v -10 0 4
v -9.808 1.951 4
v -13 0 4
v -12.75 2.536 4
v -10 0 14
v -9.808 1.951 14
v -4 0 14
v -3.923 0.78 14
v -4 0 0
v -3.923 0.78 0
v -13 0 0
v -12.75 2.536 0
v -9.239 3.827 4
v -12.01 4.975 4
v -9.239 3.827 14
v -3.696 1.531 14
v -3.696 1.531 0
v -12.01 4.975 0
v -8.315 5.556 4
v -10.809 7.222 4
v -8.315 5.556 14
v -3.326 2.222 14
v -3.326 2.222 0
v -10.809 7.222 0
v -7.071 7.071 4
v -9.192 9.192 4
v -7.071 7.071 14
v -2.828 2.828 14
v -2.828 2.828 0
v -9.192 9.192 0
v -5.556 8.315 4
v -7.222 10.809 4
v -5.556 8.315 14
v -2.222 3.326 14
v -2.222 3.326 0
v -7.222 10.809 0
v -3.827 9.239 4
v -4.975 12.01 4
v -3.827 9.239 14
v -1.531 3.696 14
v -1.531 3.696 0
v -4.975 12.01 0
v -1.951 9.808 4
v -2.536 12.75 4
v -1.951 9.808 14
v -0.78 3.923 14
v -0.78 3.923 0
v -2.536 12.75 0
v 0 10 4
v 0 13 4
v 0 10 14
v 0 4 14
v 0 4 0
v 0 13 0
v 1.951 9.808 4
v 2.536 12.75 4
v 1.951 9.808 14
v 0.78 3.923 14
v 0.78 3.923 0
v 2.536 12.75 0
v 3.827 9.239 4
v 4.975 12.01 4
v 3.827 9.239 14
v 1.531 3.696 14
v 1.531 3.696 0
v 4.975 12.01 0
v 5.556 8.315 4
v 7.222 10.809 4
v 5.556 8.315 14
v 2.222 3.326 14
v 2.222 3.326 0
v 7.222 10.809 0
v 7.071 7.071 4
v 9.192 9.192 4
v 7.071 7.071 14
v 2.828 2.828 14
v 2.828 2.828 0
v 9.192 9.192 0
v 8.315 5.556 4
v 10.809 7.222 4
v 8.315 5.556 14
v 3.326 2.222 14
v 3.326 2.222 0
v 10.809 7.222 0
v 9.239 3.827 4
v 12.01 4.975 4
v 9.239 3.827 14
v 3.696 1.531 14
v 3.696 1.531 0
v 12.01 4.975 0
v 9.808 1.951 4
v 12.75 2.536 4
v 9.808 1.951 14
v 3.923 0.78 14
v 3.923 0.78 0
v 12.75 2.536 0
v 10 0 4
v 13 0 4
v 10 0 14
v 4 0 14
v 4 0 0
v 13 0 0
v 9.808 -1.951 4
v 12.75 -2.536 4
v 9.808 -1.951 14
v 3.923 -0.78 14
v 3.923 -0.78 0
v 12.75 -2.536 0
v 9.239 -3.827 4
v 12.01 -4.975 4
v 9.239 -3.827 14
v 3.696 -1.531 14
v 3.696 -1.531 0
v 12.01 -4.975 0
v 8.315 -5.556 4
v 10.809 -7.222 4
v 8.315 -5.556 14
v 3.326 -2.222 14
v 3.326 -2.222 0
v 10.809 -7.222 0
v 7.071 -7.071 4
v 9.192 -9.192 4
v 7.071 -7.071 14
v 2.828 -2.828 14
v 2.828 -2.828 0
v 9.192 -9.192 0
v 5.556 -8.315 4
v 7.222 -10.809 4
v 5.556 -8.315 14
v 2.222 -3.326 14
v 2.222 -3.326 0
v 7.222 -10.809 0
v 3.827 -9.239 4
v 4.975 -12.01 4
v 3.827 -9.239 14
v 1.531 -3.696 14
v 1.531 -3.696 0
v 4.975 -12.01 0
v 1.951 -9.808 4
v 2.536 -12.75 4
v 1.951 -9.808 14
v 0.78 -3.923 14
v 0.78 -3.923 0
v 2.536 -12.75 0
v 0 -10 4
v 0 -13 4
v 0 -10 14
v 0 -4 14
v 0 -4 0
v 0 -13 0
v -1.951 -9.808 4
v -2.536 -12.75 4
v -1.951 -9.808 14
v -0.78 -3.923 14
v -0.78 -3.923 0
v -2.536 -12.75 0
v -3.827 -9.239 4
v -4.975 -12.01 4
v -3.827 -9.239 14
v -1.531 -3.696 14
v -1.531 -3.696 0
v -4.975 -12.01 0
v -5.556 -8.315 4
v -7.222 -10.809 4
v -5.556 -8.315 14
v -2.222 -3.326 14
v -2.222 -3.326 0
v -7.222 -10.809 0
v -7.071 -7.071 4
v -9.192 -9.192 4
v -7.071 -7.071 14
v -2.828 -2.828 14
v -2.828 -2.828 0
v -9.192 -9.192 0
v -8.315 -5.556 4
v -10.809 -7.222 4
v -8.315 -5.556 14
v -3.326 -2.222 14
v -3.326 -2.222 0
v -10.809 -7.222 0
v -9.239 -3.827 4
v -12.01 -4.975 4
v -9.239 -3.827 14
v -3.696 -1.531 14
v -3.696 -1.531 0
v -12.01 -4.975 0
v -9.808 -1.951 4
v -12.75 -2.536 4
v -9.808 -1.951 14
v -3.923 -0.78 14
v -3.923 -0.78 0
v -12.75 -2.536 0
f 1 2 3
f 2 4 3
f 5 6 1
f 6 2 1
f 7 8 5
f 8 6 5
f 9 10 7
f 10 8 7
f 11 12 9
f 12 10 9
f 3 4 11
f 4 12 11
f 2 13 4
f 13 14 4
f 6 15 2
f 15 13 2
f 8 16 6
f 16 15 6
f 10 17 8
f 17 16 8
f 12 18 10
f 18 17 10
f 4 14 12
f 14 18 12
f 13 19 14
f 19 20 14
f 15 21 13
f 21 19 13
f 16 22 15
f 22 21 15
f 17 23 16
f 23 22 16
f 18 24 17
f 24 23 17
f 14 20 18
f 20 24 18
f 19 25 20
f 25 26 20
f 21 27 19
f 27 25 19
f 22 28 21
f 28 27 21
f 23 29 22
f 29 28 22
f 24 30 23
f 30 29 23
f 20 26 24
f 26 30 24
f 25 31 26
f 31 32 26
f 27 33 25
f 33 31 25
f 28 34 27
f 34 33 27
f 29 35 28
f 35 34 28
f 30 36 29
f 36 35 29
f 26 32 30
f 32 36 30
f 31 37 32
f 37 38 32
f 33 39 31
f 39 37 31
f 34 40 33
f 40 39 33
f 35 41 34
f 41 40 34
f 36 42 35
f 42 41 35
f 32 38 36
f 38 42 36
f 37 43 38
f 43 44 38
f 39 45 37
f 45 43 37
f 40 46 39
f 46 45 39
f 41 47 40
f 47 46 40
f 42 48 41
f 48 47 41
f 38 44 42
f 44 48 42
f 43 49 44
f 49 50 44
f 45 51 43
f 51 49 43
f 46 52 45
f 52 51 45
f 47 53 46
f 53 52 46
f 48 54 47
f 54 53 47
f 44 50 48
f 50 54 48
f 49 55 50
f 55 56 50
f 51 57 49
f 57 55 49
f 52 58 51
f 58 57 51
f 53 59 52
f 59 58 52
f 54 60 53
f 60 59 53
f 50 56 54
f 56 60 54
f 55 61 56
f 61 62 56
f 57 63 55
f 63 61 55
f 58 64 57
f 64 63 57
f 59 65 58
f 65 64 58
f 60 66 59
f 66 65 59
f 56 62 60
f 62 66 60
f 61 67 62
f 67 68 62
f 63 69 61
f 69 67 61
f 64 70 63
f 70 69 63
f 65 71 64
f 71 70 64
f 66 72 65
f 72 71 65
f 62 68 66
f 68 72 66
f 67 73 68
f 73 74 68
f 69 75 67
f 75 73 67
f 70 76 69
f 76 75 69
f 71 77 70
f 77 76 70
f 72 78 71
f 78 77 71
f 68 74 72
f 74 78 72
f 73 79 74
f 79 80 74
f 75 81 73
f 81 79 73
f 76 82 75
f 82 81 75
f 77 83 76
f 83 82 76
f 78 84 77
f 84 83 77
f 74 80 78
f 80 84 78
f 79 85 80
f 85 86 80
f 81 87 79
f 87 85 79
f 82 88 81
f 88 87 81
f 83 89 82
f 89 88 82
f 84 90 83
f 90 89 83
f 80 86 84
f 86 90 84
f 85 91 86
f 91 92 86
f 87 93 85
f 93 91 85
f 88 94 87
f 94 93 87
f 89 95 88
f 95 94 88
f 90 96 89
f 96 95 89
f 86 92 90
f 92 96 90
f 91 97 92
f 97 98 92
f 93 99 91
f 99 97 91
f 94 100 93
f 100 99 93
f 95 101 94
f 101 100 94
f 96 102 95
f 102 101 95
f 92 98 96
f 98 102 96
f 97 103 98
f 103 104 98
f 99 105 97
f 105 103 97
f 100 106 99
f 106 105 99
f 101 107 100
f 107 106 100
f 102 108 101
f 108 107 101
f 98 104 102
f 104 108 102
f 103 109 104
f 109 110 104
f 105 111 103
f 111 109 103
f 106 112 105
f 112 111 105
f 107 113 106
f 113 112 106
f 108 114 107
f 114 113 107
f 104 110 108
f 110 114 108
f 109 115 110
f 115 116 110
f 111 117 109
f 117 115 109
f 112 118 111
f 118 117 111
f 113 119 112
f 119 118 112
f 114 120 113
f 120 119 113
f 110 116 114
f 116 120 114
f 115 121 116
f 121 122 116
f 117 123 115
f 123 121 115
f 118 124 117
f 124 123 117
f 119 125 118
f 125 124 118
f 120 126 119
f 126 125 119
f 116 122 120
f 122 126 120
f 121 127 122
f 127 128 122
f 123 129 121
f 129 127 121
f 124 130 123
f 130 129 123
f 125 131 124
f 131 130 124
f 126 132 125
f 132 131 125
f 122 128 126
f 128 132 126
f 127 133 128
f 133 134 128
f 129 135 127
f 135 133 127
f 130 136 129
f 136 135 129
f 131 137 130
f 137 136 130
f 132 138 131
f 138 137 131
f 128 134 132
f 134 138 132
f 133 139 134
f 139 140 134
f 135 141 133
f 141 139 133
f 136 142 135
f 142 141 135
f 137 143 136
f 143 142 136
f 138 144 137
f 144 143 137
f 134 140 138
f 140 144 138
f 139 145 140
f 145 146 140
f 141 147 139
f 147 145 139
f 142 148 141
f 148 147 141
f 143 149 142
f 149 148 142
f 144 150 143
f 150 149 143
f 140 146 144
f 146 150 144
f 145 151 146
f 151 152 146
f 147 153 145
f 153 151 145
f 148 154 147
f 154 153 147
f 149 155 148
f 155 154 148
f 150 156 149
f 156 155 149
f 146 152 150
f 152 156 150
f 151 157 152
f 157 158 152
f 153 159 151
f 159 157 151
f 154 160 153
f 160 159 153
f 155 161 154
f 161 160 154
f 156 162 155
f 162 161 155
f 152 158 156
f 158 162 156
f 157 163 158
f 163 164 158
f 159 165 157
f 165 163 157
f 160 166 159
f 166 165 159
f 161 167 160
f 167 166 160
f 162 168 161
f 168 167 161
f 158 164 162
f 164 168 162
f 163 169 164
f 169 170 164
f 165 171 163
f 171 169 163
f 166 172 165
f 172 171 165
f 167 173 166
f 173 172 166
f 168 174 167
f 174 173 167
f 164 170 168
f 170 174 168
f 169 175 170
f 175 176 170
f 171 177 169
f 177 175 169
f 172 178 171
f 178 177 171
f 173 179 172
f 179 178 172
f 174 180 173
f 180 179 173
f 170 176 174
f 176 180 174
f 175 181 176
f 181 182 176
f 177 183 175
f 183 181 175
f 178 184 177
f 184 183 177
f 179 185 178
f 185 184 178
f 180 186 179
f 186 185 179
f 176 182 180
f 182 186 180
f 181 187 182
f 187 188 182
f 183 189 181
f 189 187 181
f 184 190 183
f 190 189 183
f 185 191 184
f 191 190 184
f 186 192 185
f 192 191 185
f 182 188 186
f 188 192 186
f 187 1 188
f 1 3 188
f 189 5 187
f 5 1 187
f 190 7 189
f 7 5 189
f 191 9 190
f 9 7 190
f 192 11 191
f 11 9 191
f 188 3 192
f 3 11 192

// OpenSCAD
$fn = 32;

// ----------------------------------------------------------------------
// Arc stop: collar, 14 mm thick
// ----------------------------------------------------------------------

// --- parameters (mm) ---
revolve_angle = 360;      // full turn around the Z axis
profile_points = 6;       // points of the closed outline

profile = [[4, 0], [13, 0], [13, 4], [10, 4], [10, 14], [4, 14]];  // single closed polygon, 6 points, counter clockwise

// --- the one profile operation ---
rotate_extrude(angle = revolve_angle) polygon(points = profile);
